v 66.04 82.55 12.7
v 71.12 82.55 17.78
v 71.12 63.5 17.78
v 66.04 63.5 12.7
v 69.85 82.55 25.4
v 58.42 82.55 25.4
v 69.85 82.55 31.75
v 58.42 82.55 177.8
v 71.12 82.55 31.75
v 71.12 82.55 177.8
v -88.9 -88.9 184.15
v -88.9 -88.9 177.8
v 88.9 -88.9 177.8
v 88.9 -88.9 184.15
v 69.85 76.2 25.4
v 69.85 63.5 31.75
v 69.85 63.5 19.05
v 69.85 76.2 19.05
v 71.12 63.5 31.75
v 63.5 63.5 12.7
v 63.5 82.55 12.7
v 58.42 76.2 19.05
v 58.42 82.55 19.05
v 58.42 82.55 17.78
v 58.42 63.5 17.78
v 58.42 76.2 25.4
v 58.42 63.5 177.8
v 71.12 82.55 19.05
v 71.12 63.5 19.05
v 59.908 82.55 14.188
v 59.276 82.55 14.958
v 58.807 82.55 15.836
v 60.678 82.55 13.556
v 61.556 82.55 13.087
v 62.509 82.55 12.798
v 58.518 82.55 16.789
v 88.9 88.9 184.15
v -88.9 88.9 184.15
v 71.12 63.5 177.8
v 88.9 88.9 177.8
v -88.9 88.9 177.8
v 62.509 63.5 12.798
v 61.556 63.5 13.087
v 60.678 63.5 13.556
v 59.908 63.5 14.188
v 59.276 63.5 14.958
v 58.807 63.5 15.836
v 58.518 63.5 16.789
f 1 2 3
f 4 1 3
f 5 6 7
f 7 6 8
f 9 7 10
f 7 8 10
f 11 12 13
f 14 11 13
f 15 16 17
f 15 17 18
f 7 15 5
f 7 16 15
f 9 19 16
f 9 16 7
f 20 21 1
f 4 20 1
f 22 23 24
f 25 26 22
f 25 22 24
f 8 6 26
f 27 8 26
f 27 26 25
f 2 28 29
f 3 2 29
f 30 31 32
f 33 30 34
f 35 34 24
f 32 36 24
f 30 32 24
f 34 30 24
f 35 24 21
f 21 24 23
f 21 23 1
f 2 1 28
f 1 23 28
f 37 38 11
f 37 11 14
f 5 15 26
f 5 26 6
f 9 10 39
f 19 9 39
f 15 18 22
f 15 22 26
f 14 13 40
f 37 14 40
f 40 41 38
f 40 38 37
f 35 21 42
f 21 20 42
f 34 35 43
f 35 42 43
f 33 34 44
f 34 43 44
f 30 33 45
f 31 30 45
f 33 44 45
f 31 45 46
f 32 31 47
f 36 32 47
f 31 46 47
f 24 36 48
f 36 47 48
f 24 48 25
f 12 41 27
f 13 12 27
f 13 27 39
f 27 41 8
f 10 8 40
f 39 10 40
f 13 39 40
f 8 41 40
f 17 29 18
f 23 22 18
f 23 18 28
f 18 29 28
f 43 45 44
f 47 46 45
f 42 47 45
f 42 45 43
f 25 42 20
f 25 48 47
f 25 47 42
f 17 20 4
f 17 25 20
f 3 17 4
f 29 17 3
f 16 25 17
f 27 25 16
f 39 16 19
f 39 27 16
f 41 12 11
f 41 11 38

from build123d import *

# Parameters (mm, degrees)
F1_W      = 177.8
F1_H      = 177.8
F2_DEPTH  = 6.35
F3_W      = 12.7
F3_H      = 19.05
F4_DEPTH  = 165.1
F5_W      = 19.05
F5_H      = 12.7
F6_DEPTH  = 1.27
F7_SIZE   = 5.08
F8_R      = 5.08
F9_W      = 6.35
F9_H      = 6.35
F10_DEPTH = 25.4


with BuildPart() as f2:
    # F1 (on offset) → F2 (new body)
    with BuildSketch(Plane.XY.offset(177.8)):
        Rectangle(F1_W, F1_H)
    extrude(amount=F2_DEPTH)

    # F3 (on face) → F4 (join)
    with BuildSketch(Plane(origin=(0, 0, 177.8), x_dir=(1, 0, 0), z_dir=(0, 0, -1))):
        with Locations((64.77, -73.025)):
            Rectangle(F3_W, F3_H)
    extrude(amount=F4_DEPTH)

    # F5 (on face) → F6 (cut)
    with BuildSketch(Plane.YZ.offset(71.12)):
        with Locations((73.025, 25.4)):
            Rectangle(F5_W, F5_H)
    extrude(amount=-F6_DEPTH, mode=Mode.SUBTRACT)

    # F7
    f7_edges = [f2.edges().sort_by_distance(p)[0] for p in [
        (71.12, 73.025, 12.7),
    ]]
    chamfer(f7_edges, length=F7_SIZE)

    # F8
    f8_edges = [f2.edges().sort_by_distance(p)[0] for p in [
        (58.42, 73.025, 12.7),
    ]]
    fillet(f8_edges, radius=F8_R)

    # F9 (on face) → F10 (cut)
    with BuildSketch(Plane.YZ.offset(69.85)):
        with Locations((79.375, 22.225)):
            Rectangle(F9_W, F9_H)
    extrude(amount=-F10_DEPTH, mode=Mode.SUBTRACT)


solid = f2.part
